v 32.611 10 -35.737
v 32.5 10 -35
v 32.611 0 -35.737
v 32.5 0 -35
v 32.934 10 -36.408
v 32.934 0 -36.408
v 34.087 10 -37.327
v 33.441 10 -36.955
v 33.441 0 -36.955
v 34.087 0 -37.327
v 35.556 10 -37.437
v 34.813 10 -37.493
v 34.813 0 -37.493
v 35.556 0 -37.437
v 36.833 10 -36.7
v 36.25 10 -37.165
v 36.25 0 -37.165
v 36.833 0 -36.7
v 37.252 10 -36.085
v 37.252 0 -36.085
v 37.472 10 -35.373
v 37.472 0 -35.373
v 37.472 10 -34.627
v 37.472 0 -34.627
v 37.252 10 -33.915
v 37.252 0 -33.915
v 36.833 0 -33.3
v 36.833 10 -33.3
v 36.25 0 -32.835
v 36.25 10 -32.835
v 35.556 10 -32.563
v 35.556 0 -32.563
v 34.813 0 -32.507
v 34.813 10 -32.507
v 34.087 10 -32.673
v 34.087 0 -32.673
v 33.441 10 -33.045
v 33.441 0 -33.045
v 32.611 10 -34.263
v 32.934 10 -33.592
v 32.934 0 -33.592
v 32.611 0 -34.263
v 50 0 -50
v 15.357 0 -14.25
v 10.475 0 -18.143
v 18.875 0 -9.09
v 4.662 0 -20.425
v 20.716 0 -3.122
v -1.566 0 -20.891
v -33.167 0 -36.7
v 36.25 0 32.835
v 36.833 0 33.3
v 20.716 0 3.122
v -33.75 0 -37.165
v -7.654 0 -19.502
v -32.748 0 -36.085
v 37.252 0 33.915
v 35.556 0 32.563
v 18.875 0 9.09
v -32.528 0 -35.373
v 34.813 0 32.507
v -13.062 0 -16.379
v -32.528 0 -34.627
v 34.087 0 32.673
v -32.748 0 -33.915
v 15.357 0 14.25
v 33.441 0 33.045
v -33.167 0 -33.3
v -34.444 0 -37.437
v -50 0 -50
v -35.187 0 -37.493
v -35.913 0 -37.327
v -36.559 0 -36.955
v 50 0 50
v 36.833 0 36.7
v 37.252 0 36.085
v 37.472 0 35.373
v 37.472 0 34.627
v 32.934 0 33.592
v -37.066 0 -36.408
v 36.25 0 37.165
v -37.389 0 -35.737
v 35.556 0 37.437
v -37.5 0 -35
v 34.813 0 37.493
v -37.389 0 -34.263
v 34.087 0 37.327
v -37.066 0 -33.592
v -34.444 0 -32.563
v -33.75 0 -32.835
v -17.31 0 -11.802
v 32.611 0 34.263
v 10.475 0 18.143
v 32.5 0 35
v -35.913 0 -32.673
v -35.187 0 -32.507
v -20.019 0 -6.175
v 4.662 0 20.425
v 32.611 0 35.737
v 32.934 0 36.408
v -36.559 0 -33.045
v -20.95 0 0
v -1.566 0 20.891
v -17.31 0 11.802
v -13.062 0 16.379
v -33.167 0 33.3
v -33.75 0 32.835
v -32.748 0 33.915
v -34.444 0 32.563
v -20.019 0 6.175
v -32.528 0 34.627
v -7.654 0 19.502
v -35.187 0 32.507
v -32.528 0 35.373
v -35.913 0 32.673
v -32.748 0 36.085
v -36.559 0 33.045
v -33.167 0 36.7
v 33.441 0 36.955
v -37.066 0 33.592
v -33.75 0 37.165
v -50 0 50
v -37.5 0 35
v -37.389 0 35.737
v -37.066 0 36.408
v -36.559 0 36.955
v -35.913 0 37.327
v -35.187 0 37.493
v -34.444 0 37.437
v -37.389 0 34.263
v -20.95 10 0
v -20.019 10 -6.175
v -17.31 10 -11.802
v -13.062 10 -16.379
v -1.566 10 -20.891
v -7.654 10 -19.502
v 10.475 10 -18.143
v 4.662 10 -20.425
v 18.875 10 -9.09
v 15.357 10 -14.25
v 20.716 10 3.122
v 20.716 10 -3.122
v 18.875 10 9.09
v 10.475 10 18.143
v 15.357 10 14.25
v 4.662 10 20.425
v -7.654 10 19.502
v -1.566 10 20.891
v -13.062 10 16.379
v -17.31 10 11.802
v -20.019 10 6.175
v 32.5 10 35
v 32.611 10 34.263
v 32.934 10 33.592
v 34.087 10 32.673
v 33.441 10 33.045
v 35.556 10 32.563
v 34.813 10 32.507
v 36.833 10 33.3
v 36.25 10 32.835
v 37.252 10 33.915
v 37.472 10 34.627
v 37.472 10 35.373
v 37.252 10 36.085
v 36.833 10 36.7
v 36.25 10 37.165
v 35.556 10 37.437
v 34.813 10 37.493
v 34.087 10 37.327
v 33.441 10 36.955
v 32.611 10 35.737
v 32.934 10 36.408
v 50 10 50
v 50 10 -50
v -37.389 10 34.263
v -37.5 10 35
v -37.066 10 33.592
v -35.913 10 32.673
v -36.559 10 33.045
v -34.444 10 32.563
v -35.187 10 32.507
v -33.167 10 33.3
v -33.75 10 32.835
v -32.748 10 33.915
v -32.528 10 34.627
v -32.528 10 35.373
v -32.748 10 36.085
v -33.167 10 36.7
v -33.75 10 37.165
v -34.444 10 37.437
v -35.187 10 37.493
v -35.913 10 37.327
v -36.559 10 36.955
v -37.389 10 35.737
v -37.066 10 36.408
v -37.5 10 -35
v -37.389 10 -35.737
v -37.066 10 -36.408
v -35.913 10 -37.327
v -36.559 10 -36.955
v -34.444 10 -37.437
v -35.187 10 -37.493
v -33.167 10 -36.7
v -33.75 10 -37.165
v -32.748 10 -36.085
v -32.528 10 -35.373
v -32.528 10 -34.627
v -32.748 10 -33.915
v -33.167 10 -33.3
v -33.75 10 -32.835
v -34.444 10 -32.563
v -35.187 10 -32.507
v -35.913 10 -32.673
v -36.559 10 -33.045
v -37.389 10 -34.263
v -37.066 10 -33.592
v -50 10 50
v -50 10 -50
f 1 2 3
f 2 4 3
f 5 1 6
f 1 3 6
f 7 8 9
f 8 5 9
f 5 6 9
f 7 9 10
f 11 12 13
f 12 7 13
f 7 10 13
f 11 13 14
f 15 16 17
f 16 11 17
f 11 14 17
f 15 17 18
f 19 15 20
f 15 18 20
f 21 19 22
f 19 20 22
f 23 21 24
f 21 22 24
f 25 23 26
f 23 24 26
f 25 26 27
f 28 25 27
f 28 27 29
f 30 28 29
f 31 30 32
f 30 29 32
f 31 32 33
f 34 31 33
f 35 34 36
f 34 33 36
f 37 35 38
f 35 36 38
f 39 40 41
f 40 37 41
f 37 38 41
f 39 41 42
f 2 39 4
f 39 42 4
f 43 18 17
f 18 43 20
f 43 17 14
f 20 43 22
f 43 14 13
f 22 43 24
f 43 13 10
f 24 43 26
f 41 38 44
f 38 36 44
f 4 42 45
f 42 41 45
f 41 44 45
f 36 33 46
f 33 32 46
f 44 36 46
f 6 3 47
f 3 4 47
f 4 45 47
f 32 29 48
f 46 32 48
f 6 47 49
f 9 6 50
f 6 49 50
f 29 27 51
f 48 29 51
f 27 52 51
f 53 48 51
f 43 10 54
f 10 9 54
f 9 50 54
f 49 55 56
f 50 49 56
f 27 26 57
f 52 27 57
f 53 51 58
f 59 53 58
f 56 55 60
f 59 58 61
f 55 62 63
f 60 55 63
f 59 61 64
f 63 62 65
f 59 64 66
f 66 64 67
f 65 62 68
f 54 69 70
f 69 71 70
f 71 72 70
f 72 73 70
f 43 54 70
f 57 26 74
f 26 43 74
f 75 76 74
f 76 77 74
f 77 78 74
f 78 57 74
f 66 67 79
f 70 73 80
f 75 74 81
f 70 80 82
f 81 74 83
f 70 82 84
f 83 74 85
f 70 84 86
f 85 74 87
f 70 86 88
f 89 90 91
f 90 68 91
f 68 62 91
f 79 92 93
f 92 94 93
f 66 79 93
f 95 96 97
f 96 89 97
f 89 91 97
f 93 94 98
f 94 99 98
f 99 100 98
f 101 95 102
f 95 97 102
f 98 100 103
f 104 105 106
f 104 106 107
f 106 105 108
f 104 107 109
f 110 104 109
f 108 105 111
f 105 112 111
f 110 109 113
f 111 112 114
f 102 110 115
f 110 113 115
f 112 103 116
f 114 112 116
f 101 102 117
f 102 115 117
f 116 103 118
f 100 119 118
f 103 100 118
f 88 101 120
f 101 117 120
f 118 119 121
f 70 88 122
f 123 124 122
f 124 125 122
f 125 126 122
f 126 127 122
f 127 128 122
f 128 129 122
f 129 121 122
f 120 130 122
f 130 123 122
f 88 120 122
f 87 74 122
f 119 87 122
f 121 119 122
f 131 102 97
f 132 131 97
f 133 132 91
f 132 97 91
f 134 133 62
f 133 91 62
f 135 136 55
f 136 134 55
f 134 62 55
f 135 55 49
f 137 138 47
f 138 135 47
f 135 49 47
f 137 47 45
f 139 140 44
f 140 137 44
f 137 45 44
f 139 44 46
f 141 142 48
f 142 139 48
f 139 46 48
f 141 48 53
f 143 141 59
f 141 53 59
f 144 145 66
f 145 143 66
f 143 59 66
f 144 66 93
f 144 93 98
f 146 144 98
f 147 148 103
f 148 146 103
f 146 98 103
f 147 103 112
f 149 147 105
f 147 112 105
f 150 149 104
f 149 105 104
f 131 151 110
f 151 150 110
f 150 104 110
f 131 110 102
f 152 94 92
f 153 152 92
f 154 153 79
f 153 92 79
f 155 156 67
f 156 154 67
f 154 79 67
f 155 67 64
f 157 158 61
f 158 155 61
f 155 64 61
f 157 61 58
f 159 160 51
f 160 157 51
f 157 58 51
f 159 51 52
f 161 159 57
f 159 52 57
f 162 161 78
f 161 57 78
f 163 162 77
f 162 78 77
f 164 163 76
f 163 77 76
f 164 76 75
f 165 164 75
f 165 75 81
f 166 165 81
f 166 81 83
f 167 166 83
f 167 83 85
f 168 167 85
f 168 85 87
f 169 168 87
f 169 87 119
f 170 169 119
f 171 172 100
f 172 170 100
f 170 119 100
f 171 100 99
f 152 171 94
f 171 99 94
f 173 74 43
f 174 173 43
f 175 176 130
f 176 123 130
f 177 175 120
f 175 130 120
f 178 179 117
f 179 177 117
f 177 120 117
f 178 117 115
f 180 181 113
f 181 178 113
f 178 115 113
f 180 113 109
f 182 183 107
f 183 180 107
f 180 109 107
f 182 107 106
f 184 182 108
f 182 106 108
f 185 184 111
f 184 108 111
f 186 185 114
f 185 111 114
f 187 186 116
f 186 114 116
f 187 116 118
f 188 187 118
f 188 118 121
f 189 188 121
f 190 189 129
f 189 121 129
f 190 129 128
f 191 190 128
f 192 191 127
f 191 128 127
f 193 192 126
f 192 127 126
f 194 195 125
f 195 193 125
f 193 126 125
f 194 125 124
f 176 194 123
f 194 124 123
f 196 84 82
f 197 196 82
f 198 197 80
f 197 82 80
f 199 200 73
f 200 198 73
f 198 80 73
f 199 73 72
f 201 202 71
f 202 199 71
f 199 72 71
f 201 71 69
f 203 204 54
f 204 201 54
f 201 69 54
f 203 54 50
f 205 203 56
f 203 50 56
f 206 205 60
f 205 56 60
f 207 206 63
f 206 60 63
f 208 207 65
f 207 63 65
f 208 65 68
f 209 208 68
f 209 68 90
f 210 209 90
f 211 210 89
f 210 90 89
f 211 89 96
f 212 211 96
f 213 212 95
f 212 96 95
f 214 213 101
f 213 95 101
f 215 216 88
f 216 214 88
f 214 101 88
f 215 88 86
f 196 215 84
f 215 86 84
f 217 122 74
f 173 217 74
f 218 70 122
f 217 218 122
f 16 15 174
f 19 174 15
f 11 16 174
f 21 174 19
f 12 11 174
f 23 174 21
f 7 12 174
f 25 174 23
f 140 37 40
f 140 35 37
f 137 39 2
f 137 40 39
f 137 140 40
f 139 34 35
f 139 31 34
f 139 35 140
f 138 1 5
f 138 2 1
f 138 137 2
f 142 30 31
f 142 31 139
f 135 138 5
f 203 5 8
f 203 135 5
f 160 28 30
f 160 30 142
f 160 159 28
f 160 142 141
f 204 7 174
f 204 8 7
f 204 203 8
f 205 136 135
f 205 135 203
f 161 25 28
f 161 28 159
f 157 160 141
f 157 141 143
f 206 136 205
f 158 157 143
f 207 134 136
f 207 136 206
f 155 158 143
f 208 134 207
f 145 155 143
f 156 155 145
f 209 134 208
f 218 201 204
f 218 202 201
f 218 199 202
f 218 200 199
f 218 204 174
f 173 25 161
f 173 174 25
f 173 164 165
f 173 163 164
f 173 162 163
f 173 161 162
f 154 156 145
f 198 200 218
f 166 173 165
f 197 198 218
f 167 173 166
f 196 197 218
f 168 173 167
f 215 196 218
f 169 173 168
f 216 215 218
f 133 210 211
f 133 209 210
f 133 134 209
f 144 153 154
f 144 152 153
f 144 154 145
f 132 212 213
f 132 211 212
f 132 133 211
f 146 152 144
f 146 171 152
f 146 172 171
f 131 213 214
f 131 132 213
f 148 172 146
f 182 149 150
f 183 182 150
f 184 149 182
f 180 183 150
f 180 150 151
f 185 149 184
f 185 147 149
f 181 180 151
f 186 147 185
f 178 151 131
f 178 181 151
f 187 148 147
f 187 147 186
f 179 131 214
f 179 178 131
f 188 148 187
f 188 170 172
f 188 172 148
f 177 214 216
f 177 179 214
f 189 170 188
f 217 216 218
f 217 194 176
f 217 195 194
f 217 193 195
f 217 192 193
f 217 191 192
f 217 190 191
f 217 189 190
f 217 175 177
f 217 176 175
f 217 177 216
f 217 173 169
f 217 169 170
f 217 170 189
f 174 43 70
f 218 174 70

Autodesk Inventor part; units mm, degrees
ref_plane "YZ Plane" through (0, 0, 0) normal (1, 0, 0) x (0, 1, 0)
ref_plane "XZ Plane" through (0, 0, 0) normal (0, 1, 0) x (-1, 0, 0)
ref_plane "XY Plane" through (0, 0, 0) normal (0, 0, 1) x (1, 0, 0)
sketch "Sketch1" plane through (0, 0, 0) normal (0, 1, 0) x (-1, 0, 0)
  circle A0 centre (-35, 35) radius 2.5
  circle A1 centre (35, -35) radius 2.5
  circle A2 centre (35, 35) radius 2.5
  circle A3 centre (-35, -35) radius 2.5
  line L0 (-35, -35) -> (35, -35) construction
  circle A4 centre (0, 0) radius 20.95
  line L1 (35, -35) -> (35, 35) construction
  line L2 (-35, 35) -> (-35, -35) construction
  line L3 (35, 35) -> (-35, 35) construction
  line L4 (-35, 35) -> (35, -35) construction
  line L5 (35, 35) -> (-35, -35) construction
  line L6 (50, 50) -> (-50, 50)
  line L7 (-50, 50) -> (-50, -50)
  line L8 (-50, -50) -> (50, -50)
  line L9 (50, -50) -> (50, 50)
  line L10 (50, 50) -> (-50, -50) construction
  line L11 (-50, 50) -> (50, -50) construction
  dimension "d4" = 41.9
  dimension "d5" = 70
  dimension "d6" = 70
  dimension "d7" = 5
  dimension "d8" = 100
  dimension "d9" = 100
extrude "Extrusion1" add sketch "Sketch1" along normal blind 10
properties part number "Bearing Plate"
